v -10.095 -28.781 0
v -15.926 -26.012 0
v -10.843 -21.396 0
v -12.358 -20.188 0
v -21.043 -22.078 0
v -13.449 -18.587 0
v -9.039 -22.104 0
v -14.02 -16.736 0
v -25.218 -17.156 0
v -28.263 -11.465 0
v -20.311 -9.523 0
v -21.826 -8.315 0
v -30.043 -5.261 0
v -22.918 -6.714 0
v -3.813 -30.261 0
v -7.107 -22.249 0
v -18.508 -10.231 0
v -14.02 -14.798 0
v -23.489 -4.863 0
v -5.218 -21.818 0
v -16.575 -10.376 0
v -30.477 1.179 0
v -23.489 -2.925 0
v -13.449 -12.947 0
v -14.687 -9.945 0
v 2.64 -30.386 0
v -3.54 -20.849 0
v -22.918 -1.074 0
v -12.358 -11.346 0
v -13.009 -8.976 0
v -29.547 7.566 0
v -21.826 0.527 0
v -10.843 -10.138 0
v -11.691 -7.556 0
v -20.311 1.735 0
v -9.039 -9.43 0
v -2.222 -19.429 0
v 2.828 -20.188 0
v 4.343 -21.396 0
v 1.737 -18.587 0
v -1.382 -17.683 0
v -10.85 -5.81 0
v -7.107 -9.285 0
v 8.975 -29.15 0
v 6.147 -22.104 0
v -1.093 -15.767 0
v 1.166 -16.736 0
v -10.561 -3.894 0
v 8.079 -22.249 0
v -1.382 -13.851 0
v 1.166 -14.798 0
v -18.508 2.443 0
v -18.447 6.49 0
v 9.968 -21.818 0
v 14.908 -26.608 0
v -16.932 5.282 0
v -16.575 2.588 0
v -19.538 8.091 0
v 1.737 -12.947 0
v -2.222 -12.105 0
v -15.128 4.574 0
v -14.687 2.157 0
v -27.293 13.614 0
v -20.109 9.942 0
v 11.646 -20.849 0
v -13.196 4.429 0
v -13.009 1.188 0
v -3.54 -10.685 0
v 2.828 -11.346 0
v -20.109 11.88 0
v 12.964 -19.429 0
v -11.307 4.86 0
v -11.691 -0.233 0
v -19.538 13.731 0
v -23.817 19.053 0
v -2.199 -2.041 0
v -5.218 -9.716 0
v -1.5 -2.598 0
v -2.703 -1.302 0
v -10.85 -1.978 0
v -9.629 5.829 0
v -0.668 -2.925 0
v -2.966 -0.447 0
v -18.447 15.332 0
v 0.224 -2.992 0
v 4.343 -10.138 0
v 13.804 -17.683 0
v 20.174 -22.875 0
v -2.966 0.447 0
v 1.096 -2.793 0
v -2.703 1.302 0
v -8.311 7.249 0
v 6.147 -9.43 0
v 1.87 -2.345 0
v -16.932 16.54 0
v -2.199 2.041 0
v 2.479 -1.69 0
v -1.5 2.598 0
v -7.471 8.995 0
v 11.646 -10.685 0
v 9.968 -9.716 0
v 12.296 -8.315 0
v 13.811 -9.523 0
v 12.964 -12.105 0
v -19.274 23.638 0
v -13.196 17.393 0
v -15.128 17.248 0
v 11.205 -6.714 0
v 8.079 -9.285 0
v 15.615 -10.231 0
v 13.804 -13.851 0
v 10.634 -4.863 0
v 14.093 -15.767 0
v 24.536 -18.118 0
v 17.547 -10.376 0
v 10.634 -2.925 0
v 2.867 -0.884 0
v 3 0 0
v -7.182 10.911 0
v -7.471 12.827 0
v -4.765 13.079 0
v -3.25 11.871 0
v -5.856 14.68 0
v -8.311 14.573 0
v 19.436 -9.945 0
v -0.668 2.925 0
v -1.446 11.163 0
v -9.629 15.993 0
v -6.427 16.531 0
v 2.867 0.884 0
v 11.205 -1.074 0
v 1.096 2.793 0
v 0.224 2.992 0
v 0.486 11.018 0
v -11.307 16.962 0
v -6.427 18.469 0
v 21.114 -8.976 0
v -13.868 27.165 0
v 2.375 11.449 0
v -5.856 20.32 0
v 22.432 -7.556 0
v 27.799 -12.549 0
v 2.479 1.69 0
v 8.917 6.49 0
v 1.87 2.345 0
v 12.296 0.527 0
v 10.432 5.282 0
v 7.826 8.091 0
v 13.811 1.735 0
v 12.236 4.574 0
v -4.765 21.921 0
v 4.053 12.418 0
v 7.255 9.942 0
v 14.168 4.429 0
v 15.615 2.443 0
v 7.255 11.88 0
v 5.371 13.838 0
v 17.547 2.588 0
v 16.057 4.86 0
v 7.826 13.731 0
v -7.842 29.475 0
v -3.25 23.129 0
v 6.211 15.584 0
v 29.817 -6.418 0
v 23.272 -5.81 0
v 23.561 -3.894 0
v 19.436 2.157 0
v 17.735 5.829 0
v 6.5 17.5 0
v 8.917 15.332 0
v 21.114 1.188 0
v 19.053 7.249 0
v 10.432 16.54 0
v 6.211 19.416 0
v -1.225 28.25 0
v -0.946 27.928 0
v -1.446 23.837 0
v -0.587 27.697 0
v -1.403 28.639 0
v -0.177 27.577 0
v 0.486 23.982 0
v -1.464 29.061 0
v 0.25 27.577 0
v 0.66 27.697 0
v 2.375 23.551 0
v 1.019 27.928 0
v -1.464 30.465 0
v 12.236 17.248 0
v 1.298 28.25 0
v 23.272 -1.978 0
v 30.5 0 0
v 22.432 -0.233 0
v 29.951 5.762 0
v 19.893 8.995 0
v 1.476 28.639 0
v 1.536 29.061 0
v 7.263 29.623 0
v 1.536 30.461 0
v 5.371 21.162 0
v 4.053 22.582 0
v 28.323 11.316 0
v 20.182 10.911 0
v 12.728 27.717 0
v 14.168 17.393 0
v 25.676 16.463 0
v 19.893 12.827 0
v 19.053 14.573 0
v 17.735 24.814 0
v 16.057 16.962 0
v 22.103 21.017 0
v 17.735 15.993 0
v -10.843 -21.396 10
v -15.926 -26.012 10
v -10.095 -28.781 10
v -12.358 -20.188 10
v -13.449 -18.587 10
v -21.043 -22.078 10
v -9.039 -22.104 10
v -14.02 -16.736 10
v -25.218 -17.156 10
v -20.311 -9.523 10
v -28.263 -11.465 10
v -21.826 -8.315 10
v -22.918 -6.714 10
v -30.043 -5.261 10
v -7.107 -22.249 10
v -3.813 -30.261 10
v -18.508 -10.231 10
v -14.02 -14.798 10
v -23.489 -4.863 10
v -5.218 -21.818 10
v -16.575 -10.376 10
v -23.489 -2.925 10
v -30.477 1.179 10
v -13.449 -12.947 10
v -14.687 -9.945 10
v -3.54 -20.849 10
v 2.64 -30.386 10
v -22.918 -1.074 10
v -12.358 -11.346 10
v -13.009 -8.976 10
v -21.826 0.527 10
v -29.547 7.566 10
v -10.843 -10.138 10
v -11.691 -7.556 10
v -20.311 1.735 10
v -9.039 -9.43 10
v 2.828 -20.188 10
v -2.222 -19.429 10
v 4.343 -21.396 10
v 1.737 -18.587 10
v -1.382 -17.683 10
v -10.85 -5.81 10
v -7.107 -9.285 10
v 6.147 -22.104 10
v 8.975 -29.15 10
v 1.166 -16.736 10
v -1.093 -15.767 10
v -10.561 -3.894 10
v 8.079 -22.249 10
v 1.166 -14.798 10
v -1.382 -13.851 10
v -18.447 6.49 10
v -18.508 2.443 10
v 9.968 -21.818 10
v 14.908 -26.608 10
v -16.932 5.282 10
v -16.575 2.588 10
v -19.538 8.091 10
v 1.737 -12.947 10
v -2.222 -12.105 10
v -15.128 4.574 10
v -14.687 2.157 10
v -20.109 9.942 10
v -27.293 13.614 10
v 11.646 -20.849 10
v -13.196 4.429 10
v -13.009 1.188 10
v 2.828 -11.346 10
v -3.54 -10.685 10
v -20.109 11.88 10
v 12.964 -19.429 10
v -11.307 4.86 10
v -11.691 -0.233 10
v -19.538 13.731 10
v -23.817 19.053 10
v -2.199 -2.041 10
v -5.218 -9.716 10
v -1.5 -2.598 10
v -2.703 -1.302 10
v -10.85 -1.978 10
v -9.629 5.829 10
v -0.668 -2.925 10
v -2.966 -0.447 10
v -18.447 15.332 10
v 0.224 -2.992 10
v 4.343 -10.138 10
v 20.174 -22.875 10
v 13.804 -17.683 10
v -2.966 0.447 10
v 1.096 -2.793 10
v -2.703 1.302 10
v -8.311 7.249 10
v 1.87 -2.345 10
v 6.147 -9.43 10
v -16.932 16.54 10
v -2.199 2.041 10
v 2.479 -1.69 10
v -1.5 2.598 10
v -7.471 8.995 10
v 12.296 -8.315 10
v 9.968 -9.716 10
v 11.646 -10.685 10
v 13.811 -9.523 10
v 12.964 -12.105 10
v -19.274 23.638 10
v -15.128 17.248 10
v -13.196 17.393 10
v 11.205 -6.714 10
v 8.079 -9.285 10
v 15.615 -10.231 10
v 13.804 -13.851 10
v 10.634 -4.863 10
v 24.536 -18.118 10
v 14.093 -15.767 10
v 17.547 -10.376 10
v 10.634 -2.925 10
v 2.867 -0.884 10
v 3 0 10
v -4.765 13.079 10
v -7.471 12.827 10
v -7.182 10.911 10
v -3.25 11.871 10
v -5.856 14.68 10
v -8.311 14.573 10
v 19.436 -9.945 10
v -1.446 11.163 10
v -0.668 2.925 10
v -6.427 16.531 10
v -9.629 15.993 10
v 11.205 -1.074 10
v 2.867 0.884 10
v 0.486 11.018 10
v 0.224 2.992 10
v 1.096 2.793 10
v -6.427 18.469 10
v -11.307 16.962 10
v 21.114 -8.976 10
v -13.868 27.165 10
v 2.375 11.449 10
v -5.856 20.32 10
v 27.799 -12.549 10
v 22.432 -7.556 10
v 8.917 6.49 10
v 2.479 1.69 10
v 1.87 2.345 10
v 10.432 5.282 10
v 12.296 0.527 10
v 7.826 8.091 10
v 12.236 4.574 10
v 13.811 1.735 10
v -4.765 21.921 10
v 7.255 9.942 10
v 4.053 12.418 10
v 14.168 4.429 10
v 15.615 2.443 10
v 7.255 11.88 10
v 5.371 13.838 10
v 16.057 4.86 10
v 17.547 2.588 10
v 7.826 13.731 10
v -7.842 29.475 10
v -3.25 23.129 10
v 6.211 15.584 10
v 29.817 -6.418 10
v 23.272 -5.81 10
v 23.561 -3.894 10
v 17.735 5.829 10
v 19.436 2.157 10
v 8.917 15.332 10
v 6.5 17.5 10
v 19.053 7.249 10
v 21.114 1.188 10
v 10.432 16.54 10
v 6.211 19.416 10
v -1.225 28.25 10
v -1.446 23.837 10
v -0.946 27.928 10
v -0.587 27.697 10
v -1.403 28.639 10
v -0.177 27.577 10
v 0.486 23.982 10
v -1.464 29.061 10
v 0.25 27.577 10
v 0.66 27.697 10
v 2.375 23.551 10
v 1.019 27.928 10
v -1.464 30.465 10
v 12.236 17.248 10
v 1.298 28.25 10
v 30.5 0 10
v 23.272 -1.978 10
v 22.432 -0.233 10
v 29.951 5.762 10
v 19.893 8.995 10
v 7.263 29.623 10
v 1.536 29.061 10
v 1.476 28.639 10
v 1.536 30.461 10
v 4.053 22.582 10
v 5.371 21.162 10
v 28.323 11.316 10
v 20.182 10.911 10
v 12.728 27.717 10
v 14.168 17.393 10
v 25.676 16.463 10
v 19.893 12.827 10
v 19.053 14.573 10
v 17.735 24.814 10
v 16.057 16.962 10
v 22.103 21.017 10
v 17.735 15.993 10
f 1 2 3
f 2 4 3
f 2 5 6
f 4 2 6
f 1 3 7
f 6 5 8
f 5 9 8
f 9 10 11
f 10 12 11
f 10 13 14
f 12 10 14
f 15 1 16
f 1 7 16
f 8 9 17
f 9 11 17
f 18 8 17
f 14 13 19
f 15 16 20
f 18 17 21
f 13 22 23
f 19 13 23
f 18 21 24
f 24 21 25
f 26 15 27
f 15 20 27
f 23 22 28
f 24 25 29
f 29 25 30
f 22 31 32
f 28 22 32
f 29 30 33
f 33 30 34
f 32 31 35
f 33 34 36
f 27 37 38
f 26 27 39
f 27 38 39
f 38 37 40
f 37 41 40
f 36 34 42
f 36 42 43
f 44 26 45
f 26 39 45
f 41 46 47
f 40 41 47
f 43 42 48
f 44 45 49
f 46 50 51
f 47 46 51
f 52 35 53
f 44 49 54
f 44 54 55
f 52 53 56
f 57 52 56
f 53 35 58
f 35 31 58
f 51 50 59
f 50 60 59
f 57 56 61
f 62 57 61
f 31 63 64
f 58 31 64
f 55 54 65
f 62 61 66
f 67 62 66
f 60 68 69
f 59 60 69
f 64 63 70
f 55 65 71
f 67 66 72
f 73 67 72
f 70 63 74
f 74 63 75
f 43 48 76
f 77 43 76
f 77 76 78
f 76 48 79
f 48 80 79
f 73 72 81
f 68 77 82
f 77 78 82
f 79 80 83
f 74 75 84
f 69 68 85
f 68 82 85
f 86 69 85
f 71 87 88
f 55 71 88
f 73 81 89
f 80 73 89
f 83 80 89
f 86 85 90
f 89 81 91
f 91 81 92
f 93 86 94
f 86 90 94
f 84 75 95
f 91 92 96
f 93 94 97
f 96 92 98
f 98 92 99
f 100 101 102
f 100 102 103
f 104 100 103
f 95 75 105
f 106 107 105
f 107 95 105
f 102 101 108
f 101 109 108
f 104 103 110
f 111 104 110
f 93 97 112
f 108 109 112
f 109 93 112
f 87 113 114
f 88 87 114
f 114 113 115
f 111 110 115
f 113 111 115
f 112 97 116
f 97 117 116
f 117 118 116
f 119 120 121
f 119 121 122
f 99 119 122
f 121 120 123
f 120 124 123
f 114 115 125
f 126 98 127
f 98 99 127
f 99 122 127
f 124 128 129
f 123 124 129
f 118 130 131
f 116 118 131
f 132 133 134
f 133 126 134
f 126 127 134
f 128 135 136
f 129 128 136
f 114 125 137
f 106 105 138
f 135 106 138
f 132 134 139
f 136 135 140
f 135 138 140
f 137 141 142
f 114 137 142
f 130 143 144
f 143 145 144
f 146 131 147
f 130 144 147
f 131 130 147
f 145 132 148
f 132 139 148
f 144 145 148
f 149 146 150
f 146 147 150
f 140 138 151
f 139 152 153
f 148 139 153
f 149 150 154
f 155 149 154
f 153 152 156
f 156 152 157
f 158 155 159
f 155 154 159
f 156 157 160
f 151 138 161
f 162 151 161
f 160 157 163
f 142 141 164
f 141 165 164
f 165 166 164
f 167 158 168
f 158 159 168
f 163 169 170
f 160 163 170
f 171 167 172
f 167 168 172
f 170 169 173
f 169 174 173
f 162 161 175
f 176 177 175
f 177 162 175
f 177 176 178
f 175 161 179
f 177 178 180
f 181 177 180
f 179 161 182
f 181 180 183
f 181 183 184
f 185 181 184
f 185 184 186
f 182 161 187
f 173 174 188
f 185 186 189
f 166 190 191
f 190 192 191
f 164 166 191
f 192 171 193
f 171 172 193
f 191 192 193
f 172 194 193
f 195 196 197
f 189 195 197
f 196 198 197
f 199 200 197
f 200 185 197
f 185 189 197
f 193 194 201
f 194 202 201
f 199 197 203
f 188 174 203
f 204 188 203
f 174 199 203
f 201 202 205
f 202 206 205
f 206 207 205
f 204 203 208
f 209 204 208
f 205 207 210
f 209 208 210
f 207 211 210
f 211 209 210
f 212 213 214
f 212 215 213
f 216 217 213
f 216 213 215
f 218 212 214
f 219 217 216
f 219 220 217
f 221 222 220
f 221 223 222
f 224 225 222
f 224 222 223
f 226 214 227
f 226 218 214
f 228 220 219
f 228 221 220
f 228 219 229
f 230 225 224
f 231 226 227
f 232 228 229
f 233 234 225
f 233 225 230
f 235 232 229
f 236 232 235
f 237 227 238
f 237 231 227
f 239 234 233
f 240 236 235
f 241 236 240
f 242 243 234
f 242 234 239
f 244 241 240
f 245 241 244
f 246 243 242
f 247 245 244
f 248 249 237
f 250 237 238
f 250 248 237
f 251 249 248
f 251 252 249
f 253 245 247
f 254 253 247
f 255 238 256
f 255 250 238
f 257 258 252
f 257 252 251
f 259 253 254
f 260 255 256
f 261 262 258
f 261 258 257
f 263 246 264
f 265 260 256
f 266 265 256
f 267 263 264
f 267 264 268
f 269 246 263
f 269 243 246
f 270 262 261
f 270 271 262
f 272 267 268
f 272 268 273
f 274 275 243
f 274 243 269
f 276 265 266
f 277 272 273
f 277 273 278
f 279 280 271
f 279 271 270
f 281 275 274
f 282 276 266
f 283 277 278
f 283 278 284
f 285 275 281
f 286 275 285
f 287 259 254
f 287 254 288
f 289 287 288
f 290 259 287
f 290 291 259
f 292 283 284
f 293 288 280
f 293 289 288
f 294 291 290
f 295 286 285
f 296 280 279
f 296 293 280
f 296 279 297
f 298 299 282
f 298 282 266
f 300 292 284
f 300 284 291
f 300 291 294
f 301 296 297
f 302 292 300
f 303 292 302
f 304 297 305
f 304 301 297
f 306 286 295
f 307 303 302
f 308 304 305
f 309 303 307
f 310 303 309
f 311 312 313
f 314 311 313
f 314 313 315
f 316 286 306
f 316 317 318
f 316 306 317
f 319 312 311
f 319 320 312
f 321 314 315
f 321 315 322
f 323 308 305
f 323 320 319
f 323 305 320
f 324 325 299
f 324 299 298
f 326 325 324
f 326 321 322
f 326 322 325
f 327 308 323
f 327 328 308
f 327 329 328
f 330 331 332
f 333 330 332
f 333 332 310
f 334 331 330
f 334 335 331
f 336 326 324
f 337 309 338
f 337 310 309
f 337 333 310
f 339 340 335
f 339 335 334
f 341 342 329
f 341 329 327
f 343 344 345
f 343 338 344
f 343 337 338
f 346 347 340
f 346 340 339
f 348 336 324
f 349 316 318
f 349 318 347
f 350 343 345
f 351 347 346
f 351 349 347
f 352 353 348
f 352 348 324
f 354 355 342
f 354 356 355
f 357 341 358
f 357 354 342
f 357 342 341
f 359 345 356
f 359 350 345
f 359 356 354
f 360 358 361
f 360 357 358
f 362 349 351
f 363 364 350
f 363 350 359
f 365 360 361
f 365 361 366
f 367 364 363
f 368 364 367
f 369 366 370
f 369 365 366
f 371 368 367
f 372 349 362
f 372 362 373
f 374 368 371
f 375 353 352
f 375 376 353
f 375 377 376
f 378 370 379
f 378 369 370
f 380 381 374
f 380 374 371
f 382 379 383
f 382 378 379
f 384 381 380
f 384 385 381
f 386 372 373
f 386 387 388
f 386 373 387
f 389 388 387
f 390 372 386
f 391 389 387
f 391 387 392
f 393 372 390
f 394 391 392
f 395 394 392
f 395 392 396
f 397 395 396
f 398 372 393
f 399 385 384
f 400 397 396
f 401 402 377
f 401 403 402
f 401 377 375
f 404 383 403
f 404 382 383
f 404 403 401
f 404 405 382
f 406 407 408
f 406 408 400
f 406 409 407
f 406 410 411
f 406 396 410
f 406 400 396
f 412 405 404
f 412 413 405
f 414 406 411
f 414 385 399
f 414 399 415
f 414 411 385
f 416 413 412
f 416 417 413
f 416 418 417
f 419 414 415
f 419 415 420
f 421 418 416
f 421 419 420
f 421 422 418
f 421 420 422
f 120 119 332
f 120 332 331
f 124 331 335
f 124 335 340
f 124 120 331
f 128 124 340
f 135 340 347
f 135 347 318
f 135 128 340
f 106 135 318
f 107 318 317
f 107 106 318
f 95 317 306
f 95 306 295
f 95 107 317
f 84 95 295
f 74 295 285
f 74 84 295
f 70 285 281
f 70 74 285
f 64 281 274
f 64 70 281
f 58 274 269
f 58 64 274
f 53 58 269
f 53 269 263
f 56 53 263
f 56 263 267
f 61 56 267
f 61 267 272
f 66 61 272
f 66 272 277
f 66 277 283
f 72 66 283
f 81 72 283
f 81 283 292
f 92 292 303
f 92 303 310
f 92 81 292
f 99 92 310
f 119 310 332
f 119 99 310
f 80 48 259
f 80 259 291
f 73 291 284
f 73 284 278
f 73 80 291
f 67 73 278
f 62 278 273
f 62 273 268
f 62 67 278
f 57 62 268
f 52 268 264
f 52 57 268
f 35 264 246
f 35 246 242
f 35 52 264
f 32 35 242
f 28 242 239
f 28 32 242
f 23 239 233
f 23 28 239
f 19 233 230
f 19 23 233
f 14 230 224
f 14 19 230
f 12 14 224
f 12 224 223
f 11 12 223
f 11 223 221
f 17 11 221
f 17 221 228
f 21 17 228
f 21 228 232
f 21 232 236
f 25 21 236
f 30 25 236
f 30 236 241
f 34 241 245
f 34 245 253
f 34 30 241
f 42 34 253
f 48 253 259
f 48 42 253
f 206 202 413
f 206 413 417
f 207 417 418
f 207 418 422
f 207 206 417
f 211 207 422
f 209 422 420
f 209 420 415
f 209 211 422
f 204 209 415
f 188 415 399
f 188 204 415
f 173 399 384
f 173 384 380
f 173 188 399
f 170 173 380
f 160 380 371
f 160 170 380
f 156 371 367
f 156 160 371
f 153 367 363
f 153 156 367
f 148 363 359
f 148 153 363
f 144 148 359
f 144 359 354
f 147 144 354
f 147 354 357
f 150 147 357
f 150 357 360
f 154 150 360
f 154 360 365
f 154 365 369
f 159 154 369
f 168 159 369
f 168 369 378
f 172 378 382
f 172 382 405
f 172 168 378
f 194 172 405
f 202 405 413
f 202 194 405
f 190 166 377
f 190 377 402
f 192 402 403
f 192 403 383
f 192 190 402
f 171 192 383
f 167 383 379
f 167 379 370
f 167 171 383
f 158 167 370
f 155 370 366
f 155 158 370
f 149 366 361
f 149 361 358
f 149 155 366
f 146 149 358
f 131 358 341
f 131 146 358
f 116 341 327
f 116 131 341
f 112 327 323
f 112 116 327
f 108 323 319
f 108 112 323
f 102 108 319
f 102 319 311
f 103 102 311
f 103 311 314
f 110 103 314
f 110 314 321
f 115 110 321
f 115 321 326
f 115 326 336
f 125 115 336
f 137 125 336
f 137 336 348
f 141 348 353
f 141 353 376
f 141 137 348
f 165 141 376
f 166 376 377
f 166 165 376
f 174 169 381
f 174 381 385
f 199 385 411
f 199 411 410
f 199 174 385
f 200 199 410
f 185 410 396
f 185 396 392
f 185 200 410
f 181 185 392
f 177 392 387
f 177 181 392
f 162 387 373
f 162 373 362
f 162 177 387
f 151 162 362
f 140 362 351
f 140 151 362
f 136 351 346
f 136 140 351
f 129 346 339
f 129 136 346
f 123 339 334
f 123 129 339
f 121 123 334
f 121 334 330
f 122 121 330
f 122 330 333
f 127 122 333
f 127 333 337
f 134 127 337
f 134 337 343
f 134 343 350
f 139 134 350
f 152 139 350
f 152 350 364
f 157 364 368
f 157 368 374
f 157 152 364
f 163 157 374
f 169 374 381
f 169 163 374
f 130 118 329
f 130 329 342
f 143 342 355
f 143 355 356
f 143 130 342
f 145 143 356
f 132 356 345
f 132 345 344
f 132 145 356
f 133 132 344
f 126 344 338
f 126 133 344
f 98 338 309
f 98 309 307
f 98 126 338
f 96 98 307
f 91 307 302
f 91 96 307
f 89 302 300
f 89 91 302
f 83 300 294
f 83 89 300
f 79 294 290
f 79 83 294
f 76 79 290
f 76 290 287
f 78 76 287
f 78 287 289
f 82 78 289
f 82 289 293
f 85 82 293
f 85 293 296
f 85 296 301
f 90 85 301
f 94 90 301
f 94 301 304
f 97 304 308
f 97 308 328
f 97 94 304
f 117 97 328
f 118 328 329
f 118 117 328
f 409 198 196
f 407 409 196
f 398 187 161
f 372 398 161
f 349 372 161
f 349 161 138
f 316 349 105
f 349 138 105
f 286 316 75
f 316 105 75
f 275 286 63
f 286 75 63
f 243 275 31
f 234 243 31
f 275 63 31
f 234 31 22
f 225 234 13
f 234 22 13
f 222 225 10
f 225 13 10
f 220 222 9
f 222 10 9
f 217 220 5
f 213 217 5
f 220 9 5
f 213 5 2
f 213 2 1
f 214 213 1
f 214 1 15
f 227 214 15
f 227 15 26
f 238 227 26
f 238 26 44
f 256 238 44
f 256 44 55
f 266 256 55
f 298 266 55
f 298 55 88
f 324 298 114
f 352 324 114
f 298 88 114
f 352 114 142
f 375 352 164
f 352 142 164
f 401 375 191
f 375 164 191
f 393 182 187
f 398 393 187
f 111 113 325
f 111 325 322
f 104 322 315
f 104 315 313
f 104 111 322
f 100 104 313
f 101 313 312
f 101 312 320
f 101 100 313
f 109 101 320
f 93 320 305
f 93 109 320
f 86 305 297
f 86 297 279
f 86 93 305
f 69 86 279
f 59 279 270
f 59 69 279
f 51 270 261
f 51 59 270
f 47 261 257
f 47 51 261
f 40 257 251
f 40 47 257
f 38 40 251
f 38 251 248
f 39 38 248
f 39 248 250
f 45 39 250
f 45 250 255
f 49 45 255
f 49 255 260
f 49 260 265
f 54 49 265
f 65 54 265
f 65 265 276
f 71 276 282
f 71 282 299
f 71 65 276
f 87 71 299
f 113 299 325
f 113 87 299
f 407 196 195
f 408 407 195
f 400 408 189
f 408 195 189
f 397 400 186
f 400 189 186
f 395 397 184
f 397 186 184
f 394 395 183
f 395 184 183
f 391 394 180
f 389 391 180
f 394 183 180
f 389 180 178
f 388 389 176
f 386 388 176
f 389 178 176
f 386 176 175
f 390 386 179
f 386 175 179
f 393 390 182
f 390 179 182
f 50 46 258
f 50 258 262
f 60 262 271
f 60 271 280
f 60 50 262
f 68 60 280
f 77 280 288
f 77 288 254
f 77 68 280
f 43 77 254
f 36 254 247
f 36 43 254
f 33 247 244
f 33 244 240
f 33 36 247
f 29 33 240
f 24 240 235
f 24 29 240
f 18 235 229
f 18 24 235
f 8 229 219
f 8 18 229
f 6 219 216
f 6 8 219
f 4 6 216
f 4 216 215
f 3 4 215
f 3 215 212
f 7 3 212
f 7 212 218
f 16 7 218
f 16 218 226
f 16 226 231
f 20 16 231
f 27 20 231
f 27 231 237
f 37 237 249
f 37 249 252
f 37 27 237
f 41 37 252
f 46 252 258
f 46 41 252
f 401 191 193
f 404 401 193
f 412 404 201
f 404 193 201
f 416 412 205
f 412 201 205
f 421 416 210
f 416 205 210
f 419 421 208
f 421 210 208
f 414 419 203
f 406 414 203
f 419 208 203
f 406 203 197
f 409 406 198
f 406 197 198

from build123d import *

# Parameters (mm, degrees)
SZKIC1_R                    = 6.5
SZKIC1_R_2                  = 3
DODANIE_WYCI_GNI_CIE1_DEPTH = 10


with BuildPart() as part:
    # Szkic1 → Dodanie-wyciągnięcie1 (new body)
    with BuildSketch(Plane.XY):
        with BuildLine():
            ThreePointArc((1.536461967, 29.061275164), (0.036461967, 27.561275164), (-1.463538033, 29.061275164))
            Line((-1.463538033, 29.061275164), (-1.463538033, 30.464865935))
            ThreePointArc((-1.463538033, 30.464865935), (-21.042957135, -22.07813296), (30.5, 0))
            ThreePointArc((30.5, 0), (22.103303938, 21.016516243), (1.536461967, 30.461275164))
            Line((1.536461967, 30.461275164), (1.536461967, 29.061275164))
        make_face()
        with Locations((-7.592965435, -15.766955188)):
            Circle(SZKIC1_R, mode=Mode.SUBTRACT)
        with Locations((-17.061238463, -3.894116344)):
            Circle(SZKIC1_R, mode=Mode.SUBTRACT)
        with Locations((7.592965435, -15.766955188)):
            Circle(SZKIC1_R, mode=Mode.SUBTRACT)
        with Locations((17.061238463, -3.894116344)):
            Circle(SZKIC1_R, mode=Mode.SUBTRACT)
        with Locations((-13.682050943, 10.911071533)):
            Circle(SZKIC1_R, mode=Mode.SUBTRACT)
        Circle(SZKIC1_R_2, mode=Mode.SUBTRACT)
        with Locations((13.682050943, 10.911071533)):
            Circle(SZKIC1_R, mode=Mode.SUBTRACT)
        with Locations((0, 17.5)):
            Circle(SZKIC1_R, mode=Mode.SUBTRACT)
    extrude(amount=DODANIE_WYCI_GNI_CIE1_DEPTH)


solid = part.part
